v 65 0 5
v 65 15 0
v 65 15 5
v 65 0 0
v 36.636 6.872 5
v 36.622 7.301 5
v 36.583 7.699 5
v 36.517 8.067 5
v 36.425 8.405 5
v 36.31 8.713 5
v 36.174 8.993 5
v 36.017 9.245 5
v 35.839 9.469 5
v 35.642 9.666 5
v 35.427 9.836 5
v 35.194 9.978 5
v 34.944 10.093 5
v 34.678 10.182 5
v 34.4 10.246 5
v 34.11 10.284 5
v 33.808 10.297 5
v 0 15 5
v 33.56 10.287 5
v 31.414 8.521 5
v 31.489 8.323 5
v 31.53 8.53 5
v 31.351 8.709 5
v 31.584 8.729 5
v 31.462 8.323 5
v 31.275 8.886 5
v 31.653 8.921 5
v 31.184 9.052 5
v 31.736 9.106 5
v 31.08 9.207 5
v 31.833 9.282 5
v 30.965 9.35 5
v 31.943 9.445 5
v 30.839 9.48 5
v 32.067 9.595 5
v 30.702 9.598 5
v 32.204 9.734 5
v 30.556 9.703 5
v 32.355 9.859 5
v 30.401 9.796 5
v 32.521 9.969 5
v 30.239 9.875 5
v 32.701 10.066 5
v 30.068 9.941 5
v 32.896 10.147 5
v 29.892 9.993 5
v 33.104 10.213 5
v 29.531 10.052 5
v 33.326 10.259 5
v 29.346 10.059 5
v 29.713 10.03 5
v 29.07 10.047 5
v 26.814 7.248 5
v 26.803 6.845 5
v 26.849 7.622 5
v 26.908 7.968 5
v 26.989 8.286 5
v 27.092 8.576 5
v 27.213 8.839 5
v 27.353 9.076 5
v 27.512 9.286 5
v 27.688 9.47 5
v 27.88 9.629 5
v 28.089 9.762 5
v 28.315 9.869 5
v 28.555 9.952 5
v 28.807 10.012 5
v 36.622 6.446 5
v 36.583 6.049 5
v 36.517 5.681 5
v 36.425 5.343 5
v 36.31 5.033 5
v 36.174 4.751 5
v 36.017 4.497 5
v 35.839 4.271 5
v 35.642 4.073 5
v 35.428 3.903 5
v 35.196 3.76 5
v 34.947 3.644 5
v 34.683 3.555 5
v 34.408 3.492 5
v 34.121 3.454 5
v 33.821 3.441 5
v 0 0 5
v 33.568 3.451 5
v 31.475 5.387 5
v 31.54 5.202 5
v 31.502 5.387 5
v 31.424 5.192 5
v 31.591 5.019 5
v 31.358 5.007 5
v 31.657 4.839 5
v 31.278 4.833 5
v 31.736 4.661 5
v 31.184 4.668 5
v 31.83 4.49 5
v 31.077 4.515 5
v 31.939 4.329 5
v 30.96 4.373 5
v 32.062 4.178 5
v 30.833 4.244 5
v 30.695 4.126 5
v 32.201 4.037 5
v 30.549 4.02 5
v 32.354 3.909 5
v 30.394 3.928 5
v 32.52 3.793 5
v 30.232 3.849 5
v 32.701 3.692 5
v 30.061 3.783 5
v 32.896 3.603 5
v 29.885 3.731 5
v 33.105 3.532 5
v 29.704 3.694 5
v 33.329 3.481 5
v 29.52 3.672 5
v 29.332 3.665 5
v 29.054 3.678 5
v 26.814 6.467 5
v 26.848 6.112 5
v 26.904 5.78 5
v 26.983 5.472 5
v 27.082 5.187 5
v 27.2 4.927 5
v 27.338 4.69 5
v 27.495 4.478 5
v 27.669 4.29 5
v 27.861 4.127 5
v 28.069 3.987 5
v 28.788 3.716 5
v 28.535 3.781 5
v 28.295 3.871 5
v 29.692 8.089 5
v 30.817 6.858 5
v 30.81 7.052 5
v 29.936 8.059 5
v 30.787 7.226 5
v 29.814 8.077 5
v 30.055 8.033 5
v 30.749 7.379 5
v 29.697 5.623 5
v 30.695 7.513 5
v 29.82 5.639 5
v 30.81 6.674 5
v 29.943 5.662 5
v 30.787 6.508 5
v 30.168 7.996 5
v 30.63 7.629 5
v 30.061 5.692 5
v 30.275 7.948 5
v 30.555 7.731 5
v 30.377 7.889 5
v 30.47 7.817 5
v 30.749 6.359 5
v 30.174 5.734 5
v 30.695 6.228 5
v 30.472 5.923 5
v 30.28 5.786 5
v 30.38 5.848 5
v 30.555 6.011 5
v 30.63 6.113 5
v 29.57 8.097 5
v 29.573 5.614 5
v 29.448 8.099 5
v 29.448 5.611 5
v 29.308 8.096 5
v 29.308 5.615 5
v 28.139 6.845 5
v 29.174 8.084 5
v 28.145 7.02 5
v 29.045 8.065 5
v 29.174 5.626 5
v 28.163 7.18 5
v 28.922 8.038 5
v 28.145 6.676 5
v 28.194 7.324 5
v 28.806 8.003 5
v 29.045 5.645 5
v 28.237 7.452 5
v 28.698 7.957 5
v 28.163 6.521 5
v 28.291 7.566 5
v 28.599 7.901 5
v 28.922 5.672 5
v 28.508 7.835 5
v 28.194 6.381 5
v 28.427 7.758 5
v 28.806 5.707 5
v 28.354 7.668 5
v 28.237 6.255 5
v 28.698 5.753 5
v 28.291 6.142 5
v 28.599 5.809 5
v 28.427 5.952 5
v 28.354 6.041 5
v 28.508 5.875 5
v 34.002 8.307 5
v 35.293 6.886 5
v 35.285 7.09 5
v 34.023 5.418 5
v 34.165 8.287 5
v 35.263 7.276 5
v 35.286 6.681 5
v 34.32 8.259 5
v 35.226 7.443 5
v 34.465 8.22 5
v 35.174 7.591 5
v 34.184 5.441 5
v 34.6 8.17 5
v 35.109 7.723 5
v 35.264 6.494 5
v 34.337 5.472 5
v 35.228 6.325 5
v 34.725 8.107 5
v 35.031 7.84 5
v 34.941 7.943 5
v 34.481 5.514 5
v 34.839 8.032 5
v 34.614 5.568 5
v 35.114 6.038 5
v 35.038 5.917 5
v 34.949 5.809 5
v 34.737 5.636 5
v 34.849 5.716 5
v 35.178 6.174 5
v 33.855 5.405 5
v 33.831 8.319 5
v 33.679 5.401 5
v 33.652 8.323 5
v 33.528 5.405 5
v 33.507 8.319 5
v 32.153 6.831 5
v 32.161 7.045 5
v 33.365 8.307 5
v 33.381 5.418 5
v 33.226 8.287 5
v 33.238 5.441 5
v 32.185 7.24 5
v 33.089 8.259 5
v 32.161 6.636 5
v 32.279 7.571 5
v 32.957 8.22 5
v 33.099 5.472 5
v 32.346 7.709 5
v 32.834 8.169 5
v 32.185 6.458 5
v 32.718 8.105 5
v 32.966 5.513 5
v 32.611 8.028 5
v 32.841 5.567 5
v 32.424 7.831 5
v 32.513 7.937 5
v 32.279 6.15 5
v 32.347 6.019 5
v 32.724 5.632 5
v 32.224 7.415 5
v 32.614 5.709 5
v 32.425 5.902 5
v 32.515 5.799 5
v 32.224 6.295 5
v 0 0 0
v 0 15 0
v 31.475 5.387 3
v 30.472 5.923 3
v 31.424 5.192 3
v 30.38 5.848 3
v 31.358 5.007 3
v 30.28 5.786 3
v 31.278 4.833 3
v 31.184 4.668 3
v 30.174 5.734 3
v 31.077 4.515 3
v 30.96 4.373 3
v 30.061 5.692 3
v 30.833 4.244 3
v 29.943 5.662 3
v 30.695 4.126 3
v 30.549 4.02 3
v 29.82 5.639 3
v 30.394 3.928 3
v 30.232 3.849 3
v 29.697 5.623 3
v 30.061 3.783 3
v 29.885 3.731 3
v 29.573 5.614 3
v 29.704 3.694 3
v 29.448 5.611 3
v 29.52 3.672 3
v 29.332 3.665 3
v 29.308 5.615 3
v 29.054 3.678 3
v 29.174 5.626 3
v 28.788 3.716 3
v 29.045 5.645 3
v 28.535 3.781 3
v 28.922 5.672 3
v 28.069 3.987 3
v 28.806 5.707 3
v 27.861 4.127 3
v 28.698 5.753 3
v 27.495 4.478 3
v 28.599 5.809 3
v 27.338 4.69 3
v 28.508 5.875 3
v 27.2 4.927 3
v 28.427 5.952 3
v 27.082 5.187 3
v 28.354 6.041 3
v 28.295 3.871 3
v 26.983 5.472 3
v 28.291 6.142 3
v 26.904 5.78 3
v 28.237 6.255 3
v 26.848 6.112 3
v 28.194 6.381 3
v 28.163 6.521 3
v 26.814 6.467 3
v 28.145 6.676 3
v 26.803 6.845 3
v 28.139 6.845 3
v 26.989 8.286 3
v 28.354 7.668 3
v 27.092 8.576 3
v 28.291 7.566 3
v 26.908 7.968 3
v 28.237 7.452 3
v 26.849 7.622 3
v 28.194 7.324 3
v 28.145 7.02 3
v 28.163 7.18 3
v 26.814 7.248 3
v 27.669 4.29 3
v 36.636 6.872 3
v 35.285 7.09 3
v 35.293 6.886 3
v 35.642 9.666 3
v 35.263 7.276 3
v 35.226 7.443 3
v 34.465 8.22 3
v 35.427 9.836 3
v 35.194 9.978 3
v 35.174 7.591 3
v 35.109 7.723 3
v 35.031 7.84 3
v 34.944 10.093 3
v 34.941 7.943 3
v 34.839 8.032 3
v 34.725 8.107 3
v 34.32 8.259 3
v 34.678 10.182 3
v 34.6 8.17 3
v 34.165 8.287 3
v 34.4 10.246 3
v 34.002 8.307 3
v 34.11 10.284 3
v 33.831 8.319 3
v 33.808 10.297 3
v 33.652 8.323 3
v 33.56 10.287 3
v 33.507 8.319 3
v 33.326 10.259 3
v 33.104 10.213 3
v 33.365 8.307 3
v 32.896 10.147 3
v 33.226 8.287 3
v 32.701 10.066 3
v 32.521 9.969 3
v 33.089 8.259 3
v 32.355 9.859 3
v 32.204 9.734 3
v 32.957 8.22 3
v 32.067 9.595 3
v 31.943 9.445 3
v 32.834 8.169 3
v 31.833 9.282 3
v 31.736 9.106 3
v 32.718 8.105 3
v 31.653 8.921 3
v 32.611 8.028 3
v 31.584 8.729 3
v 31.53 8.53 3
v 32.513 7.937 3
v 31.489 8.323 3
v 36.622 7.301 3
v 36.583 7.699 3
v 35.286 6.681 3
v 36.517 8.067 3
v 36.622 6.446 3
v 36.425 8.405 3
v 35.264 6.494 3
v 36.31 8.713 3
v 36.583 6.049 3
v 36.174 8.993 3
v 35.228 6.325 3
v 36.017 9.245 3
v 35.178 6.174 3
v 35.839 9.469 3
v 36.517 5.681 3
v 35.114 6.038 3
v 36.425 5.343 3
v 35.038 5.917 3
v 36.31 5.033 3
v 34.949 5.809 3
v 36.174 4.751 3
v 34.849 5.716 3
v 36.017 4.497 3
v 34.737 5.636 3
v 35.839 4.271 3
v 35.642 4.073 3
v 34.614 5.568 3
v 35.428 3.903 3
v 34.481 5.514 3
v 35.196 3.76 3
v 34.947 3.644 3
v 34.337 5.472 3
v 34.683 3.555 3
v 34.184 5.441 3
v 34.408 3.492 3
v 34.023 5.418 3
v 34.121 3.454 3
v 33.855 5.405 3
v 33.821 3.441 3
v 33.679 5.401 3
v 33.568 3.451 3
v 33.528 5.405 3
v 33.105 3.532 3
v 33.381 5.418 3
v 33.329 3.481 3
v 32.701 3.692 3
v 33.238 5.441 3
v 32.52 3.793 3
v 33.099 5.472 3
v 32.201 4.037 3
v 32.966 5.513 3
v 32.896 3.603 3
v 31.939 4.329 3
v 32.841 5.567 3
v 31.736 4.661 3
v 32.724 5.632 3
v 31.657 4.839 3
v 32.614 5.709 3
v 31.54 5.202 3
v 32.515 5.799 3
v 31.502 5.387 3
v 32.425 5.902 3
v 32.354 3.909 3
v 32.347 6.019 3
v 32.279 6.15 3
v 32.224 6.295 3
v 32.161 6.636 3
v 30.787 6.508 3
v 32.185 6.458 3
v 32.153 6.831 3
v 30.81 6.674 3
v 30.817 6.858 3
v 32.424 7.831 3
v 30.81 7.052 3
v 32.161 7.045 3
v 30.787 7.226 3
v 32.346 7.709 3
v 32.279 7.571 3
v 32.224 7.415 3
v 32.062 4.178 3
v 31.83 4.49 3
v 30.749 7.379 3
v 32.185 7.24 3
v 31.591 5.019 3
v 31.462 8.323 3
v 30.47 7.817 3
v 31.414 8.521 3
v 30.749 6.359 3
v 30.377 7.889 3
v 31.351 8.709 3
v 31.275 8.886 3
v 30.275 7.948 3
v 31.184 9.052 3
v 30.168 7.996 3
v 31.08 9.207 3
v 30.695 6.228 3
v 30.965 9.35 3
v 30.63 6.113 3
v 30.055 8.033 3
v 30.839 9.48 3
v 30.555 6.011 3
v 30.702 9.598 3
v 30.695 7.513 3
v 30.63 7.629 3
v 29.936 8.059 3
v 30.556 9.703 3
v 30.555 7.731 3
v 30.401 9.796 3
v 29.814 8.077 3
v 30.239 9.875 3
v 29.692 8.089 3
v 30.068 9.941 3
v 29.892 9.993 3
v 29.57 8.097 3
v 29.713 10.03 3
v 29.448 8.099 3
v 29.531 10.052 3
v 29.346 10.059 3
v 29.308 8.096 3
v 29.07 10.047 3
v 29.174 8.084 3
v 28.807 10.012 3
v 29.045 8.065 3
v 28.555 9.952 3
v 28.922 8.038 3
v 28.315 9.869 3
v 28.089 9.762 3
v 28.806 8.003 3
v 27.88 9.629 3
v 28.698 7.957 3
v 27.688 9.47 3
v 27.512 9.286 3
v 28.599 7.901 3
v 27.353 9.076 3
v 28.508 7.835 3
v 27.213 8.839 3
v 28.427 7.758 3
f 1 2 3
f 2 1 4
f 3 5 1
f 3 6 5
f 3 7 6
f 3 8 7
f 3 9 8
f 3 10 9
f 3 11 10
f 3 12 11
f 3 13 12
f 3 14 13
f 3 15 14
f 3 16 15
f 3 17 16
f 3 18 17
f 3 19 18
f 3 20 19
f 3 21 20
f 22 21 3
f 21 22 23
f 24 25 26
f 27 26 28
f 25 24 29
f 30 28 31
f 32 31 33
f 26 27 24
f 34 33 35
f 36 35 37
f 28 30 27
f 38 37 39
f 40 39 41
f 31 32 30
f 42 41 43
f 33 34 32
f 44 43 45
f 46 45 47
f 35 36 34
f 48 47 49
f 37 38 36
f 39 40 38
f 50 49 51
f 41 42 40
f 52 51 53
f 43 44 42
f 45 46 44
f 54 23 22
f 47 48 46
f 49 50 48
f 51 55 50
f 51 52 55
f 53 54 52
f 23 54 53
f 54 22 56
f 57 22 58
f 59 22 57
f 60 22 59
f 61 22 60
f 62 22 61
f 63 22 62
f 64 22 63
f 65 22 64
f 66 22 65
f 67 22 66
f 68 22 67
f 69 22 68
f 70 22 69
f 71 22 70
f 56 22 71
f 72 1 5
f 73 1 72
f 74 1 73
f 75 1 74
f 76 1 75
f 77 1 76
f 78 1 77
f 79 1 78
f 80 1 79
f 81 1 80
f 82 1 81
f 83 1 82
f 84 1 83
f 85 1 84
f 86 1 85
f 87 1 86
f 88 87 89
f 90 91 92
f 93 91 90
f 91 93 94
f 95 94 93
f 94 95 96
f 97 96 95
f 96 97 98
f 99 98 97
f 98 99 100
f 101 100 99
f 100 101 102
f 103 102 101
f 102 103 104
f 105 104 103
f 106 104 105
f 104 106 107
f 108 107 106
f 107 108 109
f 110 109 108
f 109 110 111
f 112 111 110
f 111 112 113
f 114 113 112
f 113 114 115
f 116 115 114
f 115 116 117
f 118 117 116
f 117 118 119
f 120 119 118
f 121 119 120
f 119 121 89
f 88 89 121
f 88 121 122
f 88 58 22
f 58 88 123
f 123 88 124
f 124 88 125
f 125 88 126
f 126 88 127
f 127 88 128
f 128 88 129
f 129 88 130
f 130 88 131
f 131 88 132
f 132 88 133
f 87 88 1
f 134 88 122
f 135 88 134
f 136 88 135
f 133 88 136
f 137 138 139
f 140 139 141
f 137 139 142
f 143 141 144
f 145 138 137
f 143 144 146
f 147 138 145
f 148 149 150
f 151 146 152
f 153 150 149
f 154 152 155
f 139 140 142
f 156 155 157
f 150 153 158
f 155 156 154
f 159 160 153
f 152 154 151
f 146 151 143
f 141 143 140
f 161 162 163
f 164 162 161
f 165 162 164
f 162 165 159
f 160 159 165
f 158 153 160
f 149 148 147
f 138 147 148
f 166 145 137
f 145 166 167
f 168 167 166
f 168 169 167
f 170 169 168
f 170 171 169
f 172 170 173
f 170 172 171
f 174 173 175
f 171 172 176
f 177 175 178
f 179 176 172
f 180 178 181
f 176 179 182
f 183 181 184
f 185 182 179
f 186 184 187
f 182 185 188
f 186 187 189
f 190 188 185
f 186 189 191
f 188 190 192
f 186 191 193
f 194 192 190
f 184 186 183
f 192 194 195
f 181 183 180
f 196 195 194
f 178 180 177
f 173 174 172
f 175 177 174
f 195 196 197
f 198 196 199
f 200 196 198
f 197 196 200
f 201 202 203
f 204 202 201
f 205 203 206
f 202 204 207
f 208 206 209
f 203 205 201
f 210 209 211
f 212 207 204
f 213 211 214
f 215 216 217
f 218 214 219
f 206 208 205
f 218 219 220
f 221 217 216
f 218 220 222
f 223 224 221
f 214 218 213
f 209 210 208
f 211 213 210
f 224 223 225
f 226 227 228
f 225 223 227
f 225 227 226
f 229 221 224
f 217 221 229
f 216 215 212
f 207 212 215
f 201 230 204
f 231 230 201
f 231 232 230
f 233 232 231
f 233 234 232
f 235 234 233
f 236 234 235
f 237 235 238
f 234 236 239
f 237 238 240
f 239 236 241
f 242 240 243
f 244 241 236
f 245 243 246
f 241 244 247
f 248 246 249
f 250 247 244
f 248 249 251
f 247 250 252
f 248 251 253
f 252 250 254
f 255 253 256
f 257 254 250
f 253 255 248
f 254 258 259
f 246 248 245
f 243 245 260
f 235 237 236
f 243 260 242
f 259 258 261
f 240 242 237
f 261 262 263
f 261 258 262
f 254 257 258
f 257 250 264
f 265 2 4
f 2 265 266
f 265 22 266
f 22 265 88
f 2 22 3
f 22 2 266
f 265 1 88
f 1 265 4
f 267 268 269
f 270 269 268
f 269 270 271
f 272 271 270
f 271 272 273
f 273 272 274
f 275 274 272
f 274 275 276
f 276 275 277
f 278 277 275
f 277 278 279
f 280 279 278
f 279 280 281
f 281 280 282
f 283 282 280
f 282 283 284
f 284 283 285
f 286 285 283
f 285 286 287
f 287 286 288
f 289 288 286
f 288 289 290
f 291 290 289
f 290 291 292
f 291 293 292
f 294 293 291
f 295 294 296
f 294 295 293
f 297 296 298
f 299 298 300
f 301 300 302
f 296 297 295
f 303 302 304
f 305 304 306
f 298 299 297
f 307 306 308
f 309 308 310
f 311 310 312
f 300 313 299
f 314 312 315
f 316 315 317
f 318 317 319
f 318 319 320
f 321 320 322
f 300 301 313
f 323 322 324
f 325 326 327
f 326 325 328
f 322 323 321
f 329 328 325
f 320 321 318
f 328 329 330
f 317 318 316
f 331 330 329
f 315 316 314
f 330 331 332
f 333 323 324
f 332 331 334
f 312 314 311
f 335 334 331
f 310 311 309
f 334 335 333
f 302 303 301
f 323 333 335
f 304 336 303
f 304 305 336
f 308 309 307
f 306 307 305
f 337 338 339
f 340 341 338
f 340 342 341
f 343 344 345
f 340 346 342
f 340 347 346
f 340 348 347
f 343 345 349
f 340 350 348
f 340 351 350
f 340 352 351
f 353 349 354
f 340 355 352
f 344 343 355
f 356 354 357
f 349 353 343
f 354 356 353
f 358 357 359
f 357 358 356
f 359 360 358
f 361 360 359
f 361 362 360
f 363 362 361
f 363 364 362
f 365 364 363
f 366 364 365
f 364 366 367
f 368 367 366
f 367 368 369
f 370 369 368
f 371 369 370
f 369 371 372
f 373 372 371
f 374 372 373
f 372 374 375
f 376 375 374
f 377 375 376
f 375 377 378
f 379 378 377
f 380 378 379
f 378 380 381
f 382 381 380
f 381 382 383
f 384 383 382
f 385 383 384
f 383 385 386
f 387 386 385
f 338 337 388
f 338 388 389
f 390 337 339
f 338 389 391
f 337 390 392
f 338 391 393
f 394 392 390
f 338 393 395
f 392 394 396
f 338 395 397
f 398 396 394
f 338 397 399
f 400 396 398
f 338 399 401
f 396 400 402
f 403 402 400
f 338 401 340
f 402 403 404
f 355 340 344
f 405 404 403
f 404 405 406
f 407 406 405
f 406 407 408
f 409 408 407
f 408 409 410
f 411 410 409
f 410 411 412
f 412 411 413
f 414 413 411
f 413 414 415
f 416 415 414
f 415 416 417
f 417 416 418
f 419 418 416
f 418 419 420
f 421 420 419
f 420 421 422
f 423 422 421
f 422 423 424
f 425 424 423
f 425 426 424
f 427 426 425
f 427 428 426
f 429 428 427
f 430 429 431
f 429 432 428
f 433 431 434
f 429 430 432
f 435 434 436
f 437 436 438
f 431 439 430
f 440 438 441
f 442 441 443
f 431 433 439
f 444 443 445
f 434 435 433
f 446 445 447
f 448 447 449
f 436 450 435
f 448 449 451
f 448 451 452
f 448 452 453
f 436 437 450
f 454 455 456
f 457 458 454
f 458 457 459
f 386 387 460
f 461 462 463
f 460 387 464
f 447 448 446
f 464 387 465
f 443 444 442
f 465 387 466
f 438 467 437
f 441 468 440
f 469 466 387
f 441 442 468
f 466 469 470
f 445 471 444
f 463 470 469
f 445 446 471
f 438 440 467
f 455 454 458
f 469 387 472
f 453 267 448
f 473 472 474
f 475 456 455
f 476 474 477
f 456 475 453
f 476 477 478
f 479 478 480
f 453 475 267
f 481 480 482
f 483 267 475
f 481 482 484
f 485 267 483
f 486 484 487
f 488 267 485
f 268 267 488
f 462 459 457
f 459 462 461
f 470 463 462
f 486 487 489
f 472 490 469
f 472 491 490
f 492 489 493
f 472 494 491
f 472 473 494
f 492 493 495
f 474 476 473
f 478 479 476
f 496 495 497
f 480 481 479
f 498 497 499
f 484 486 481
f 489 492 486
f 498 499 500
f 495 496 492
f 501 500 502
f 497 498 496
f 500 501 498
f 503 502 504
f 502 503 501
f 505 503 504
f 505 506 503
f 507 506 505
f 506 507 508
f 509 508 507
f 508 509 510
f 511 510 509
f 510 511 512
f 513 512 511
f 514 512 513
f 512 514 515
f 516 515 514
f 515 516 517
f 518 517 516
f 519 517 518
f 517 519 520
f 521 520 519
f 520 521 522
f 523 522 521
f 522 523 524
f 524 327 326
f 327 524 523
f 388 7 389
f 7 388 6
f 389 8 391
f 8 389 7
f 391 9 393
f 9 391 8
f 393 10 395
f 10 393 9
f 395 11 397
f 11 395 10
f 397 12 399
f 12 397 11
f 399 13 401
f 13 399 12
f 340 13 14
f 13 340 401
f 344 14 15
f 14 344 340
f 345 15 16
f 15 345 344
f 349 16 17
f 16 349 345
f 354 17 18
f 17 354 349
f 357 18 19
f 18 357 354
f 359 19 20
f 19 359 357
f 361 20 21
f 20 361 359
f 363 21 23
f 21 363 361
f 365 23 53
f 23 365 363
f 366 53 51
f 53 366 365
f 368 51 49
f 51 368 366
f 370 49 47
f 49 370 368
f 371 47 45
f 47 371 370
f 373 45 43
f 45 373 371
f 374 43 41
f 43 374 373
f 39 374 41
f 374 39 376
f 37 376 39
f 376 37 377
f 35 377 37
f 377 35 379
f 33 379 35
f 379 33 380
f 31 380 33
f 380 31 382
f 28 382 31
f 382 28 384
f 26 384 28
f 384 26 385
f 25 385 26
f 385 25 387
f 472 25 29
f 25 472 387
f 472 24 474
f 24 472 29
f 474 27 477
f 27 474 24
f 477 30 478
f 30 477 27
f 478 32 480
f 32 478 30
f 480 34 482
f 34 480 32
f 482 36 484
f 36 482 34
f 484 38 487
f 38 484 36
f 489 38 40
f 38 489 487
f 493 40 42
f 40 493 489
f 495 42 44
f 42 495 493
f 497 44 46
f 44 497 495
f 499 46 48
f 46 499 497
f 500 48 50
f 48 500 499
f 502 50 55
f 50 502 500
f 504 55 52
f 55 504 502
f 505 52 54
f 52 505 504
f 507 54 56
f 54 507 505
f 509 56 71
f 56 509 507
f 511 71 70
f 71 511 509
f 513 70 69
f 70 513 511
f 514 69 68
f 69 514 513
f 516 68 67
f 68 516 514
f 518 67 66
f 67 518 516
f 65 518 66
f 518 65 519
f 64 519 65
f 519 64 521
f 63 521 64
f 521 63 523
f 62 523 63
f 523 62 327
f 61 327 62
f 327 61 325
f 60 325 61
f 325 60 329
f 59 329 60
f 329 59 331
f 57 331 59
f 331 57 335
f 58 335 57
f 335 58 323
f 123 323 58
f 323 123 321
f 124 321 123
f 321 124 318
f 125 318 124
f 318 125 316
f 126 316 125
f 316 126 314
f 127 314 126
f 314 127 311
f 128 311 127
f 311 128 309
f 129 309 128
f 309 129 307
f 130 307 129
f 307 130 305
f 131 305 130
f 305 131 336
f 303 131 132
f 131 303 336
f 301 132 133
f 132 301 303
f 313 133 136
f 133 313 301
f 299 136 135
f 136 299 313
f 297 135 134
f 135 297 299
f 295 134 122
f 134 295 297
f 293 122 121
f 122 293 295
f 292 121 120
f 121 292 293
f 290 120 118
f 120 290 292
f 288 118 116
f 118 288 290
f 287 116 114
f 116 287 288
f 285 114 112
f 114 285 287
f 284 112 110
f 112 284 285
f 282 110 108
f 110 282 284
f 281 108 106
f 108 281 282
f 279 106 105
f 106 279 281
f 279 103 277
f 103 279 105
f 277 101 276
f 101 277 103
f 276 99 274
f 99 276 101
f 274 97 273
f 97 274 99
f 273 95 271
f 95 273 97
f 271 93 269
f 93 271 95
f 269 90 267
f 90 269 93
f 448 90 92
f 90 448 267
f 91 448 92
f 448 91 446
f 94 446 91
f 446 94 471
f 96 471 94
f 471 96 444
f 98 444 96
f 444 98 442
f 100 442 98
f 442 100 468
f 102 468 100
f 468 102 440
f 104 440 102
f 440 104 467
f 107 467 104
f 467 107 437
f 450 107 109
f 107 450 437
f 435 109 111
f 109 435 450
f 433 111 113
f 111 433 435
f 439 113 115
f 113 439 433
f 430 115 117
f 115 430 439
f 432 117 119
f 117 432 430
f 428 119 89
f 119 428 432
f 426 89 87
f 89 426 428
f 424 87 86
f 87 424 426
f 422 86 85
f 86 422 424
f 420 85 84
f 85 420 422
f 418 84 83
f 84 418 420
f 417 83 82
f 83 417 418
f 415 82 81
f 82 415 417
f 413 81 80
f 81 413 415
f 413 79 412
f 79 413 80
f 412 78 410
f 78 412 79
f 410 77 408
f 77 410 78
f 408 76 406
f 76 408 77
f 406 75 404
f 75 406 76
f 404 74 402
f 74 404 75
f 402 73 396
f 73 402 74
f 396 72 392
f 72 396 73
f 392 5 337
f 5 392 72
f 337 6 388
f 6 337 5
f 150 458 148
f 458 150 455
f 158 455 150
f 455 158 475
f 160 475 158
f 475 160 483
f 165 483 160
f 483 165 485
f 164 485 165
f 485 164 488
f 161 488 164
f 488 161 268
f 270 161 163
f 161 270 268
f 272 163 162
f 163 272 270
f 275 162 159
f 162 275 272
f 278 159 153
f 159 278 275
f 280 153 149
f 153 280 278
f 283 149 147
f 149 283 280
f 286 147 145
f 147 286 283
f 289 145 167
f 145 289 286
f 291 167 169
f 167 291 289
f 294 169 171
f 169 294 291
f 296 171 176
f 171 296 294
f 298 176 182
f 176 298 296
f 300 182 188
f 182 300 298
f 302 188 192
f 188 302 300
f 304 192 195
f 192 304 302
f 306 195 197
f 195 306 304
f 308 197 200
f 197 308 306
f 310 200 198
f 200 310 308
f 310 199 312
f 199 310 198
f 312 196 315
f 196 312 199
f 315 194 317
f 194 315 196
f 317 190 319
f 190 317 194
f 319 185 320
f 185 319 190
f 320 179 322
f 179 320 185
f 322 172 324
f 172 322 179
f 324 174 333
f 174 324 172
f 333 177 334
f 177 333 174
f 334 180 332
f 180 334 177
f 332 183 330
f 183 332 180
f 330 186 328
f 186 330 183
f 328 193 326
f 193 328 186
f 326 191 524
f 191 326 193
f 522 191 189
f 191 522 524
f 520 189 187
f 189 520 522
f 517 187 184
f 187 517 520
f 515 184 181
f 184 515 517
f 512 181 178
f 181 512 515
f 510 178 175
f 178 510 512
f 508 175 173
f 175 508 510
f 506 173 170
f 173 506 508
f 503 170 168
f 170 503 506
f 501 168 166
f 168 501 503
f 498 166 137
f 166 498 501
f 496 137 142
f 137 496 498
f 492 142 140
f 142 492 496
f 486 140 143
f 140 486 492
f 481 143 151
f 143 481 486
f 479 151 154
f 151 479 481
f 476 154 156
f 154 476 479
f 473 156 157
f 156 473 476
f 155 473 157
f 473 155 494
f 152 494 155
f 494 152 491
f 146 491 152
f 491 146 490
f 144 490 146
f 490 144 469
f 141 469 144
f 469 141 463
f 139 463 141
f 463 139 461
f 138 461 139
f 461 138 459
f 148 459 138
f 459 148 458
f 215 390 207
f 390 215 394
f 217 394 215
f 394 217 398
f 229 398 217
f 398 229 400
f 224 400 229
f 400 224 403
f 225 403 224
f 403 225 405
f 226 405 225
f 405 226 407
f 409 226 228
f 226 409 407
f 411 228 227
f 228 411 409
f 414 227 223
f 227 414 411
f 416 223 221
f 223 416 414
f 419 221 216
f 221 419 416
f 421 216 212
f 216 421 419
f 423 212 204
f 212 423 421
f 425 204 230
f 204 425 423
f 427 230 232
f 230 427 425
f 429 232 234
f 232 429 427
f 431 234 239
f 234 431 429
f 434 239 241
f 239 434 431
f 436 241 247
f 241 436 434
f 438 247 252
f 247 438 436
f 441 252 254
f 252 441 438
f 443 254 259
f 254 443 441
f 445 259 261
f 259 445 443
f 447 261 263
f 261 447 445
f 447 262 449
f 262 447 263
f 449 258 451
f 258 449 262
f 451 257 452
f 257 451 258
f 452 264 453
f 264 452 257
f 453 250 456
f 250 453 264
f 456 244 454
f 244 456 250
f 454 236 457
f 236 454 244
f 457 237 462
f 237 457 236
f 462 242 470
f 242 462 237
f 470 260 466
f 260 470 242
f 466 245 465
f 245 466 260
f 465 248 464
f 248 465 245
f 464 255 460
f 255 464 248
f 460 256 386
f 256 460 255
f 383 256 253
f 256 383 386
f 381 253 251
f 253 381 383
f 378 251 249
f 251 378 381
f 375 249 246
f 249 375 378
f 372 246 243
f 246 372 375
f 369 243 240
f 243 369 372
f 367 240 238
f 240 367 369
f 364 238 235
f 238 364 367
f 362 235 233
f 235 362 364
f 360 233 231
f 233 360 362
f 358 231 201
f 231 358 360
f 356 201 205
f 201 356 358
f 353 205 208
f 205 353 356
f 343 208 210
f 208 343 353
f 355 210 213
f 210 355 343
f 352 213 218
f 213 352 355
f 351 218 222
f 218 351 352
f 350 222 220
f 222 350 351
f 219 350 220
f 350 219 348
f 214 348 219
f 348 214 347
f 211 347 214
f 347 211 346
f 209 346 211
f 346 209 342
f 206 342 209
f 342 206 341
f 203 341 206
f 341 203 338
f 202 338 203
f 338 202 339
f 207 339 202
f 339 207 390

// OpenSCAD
difference(){
	union(){ 
        translate([0,0,0]){
           cube([65,15,5], center=false);
        }                
	}
	union() {
        translate([60-65/2+9, 3,3]){
            linear_extrude(height = 10) {
                rotate([0,0,90]){
                    text("8", size = 10, font="Arial:style=Bold");
                }
            }
        }                


	}
}
